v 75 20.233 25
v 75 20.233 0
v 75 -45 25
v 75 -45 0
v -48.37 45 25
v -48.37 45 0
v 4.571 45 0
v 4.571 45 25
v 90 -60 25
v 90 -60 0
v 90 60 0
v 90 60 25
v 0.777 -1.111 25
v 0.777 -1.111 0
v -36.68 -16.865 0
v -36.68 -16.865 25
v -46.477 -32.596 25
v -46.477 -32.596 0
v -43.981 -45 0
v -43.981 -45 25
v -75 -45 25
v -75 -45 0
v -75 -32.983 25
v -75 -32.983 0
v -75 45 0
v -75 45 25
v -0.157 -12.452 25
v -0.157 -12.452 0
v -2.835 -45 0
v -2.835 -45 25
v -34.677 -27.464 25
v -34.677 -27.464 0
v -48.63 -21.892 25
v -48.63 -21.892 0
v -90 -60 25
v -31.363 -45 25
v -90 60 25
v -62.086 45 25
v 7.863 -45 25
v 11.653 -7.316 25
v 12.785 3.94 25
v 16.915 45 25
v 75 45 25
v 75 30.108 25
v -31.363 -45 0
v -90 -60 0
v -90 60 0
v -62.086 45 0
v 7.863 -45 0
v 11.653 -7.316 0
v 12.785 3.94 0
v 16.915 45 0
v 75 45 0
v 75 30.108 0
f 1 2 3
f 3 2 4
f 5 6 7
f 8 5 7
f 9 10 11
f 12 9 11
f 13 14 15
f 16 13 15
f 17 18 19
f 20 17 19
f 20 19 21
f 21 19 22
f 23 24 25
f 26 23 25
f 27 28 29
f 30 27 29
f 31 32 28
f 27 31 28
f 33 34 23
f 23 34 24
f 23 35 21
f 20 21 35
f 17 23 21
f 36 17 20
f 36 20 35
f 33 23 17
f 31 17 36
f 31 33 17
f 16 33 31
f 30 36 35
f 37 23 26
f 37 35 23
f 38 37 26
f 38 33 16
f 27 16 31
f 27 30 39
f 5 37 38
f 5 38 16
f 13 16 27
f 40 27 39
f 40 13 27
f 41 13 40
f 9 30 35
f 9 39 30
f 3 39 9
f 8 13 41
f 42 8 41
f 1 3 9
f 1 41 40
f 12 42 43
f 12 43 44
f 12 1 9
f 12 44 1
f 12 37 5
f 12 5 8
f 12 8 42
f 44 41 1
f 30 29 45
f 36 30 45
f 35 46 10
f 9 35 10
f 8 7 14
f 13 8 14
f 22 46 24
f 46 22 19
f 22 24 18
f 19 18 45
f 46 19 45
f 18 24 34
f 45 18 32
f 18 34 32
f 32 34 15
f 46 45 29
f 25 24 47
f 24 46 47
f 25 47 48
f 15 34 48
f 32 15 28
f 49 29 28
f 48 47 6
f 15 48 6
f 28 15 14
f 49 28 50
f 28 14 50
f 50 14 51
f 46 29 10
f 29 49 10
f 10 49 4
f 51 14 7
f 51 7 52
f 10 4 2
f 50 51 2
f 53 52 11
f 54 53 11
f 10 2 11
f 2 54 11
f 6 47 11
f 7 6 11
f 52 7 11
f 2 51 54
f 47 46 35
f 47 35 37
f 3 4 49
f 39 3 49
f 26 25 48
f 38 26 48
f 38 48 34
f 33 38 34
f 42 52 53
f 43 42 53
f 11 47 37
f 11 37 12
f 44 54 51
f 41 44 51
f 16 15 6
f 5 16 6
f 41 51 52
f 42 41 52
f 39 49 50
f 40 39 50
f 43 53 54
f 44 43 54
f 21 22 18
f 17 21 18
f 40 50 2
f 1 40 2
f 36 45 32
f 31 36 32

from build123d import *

# Parameters (mm, degrees)
F0_W     = 180
F0_H     = 120
F1_DEPTH = 25


with BuildPart() as f1:
    # F0 (on Top) → F1 (new body)
    with BuildSketch(Plane.XY):
        Rectangle(F0_W, F0_H)
        Polygon((-46.476726, -32.595648), (-43.98147, -45), (-75, -45), align=None, mode=Mode.SUBTRACT)
        Polygon((-0.156685, -12.451744), (-2.835166, -45), (-31.363267, -45), (-34.676992, -27.464117), align=None, mode=Mode.SUBTRACT)
        Polygon((75, 20.232793), (75, -45), (7.862872, -45), (11.653141, -7.315824), align=None, mode=Mode.SUBTRACT)
        Polygon((-75, -32.983091), (-75, 45), (-62.085841, 45), (-48.629935, -21.891666), align=None, mode=Mode.SUBTRACT)
        Polygon((-36.67982, -16.865368), (-48.37041, 45), (4.571168, 45), (0.776578, -1.110959), align=None, mode=Mode.SUBTRACT)
        Polygon((16.915059, 45), (75, 45), (75, 30.107906), (12.785247, 3.939967), align=None, mode=Mode.SUBTRACT)
    extrude(amount=F1_DEPTH)


solid = f1.part
